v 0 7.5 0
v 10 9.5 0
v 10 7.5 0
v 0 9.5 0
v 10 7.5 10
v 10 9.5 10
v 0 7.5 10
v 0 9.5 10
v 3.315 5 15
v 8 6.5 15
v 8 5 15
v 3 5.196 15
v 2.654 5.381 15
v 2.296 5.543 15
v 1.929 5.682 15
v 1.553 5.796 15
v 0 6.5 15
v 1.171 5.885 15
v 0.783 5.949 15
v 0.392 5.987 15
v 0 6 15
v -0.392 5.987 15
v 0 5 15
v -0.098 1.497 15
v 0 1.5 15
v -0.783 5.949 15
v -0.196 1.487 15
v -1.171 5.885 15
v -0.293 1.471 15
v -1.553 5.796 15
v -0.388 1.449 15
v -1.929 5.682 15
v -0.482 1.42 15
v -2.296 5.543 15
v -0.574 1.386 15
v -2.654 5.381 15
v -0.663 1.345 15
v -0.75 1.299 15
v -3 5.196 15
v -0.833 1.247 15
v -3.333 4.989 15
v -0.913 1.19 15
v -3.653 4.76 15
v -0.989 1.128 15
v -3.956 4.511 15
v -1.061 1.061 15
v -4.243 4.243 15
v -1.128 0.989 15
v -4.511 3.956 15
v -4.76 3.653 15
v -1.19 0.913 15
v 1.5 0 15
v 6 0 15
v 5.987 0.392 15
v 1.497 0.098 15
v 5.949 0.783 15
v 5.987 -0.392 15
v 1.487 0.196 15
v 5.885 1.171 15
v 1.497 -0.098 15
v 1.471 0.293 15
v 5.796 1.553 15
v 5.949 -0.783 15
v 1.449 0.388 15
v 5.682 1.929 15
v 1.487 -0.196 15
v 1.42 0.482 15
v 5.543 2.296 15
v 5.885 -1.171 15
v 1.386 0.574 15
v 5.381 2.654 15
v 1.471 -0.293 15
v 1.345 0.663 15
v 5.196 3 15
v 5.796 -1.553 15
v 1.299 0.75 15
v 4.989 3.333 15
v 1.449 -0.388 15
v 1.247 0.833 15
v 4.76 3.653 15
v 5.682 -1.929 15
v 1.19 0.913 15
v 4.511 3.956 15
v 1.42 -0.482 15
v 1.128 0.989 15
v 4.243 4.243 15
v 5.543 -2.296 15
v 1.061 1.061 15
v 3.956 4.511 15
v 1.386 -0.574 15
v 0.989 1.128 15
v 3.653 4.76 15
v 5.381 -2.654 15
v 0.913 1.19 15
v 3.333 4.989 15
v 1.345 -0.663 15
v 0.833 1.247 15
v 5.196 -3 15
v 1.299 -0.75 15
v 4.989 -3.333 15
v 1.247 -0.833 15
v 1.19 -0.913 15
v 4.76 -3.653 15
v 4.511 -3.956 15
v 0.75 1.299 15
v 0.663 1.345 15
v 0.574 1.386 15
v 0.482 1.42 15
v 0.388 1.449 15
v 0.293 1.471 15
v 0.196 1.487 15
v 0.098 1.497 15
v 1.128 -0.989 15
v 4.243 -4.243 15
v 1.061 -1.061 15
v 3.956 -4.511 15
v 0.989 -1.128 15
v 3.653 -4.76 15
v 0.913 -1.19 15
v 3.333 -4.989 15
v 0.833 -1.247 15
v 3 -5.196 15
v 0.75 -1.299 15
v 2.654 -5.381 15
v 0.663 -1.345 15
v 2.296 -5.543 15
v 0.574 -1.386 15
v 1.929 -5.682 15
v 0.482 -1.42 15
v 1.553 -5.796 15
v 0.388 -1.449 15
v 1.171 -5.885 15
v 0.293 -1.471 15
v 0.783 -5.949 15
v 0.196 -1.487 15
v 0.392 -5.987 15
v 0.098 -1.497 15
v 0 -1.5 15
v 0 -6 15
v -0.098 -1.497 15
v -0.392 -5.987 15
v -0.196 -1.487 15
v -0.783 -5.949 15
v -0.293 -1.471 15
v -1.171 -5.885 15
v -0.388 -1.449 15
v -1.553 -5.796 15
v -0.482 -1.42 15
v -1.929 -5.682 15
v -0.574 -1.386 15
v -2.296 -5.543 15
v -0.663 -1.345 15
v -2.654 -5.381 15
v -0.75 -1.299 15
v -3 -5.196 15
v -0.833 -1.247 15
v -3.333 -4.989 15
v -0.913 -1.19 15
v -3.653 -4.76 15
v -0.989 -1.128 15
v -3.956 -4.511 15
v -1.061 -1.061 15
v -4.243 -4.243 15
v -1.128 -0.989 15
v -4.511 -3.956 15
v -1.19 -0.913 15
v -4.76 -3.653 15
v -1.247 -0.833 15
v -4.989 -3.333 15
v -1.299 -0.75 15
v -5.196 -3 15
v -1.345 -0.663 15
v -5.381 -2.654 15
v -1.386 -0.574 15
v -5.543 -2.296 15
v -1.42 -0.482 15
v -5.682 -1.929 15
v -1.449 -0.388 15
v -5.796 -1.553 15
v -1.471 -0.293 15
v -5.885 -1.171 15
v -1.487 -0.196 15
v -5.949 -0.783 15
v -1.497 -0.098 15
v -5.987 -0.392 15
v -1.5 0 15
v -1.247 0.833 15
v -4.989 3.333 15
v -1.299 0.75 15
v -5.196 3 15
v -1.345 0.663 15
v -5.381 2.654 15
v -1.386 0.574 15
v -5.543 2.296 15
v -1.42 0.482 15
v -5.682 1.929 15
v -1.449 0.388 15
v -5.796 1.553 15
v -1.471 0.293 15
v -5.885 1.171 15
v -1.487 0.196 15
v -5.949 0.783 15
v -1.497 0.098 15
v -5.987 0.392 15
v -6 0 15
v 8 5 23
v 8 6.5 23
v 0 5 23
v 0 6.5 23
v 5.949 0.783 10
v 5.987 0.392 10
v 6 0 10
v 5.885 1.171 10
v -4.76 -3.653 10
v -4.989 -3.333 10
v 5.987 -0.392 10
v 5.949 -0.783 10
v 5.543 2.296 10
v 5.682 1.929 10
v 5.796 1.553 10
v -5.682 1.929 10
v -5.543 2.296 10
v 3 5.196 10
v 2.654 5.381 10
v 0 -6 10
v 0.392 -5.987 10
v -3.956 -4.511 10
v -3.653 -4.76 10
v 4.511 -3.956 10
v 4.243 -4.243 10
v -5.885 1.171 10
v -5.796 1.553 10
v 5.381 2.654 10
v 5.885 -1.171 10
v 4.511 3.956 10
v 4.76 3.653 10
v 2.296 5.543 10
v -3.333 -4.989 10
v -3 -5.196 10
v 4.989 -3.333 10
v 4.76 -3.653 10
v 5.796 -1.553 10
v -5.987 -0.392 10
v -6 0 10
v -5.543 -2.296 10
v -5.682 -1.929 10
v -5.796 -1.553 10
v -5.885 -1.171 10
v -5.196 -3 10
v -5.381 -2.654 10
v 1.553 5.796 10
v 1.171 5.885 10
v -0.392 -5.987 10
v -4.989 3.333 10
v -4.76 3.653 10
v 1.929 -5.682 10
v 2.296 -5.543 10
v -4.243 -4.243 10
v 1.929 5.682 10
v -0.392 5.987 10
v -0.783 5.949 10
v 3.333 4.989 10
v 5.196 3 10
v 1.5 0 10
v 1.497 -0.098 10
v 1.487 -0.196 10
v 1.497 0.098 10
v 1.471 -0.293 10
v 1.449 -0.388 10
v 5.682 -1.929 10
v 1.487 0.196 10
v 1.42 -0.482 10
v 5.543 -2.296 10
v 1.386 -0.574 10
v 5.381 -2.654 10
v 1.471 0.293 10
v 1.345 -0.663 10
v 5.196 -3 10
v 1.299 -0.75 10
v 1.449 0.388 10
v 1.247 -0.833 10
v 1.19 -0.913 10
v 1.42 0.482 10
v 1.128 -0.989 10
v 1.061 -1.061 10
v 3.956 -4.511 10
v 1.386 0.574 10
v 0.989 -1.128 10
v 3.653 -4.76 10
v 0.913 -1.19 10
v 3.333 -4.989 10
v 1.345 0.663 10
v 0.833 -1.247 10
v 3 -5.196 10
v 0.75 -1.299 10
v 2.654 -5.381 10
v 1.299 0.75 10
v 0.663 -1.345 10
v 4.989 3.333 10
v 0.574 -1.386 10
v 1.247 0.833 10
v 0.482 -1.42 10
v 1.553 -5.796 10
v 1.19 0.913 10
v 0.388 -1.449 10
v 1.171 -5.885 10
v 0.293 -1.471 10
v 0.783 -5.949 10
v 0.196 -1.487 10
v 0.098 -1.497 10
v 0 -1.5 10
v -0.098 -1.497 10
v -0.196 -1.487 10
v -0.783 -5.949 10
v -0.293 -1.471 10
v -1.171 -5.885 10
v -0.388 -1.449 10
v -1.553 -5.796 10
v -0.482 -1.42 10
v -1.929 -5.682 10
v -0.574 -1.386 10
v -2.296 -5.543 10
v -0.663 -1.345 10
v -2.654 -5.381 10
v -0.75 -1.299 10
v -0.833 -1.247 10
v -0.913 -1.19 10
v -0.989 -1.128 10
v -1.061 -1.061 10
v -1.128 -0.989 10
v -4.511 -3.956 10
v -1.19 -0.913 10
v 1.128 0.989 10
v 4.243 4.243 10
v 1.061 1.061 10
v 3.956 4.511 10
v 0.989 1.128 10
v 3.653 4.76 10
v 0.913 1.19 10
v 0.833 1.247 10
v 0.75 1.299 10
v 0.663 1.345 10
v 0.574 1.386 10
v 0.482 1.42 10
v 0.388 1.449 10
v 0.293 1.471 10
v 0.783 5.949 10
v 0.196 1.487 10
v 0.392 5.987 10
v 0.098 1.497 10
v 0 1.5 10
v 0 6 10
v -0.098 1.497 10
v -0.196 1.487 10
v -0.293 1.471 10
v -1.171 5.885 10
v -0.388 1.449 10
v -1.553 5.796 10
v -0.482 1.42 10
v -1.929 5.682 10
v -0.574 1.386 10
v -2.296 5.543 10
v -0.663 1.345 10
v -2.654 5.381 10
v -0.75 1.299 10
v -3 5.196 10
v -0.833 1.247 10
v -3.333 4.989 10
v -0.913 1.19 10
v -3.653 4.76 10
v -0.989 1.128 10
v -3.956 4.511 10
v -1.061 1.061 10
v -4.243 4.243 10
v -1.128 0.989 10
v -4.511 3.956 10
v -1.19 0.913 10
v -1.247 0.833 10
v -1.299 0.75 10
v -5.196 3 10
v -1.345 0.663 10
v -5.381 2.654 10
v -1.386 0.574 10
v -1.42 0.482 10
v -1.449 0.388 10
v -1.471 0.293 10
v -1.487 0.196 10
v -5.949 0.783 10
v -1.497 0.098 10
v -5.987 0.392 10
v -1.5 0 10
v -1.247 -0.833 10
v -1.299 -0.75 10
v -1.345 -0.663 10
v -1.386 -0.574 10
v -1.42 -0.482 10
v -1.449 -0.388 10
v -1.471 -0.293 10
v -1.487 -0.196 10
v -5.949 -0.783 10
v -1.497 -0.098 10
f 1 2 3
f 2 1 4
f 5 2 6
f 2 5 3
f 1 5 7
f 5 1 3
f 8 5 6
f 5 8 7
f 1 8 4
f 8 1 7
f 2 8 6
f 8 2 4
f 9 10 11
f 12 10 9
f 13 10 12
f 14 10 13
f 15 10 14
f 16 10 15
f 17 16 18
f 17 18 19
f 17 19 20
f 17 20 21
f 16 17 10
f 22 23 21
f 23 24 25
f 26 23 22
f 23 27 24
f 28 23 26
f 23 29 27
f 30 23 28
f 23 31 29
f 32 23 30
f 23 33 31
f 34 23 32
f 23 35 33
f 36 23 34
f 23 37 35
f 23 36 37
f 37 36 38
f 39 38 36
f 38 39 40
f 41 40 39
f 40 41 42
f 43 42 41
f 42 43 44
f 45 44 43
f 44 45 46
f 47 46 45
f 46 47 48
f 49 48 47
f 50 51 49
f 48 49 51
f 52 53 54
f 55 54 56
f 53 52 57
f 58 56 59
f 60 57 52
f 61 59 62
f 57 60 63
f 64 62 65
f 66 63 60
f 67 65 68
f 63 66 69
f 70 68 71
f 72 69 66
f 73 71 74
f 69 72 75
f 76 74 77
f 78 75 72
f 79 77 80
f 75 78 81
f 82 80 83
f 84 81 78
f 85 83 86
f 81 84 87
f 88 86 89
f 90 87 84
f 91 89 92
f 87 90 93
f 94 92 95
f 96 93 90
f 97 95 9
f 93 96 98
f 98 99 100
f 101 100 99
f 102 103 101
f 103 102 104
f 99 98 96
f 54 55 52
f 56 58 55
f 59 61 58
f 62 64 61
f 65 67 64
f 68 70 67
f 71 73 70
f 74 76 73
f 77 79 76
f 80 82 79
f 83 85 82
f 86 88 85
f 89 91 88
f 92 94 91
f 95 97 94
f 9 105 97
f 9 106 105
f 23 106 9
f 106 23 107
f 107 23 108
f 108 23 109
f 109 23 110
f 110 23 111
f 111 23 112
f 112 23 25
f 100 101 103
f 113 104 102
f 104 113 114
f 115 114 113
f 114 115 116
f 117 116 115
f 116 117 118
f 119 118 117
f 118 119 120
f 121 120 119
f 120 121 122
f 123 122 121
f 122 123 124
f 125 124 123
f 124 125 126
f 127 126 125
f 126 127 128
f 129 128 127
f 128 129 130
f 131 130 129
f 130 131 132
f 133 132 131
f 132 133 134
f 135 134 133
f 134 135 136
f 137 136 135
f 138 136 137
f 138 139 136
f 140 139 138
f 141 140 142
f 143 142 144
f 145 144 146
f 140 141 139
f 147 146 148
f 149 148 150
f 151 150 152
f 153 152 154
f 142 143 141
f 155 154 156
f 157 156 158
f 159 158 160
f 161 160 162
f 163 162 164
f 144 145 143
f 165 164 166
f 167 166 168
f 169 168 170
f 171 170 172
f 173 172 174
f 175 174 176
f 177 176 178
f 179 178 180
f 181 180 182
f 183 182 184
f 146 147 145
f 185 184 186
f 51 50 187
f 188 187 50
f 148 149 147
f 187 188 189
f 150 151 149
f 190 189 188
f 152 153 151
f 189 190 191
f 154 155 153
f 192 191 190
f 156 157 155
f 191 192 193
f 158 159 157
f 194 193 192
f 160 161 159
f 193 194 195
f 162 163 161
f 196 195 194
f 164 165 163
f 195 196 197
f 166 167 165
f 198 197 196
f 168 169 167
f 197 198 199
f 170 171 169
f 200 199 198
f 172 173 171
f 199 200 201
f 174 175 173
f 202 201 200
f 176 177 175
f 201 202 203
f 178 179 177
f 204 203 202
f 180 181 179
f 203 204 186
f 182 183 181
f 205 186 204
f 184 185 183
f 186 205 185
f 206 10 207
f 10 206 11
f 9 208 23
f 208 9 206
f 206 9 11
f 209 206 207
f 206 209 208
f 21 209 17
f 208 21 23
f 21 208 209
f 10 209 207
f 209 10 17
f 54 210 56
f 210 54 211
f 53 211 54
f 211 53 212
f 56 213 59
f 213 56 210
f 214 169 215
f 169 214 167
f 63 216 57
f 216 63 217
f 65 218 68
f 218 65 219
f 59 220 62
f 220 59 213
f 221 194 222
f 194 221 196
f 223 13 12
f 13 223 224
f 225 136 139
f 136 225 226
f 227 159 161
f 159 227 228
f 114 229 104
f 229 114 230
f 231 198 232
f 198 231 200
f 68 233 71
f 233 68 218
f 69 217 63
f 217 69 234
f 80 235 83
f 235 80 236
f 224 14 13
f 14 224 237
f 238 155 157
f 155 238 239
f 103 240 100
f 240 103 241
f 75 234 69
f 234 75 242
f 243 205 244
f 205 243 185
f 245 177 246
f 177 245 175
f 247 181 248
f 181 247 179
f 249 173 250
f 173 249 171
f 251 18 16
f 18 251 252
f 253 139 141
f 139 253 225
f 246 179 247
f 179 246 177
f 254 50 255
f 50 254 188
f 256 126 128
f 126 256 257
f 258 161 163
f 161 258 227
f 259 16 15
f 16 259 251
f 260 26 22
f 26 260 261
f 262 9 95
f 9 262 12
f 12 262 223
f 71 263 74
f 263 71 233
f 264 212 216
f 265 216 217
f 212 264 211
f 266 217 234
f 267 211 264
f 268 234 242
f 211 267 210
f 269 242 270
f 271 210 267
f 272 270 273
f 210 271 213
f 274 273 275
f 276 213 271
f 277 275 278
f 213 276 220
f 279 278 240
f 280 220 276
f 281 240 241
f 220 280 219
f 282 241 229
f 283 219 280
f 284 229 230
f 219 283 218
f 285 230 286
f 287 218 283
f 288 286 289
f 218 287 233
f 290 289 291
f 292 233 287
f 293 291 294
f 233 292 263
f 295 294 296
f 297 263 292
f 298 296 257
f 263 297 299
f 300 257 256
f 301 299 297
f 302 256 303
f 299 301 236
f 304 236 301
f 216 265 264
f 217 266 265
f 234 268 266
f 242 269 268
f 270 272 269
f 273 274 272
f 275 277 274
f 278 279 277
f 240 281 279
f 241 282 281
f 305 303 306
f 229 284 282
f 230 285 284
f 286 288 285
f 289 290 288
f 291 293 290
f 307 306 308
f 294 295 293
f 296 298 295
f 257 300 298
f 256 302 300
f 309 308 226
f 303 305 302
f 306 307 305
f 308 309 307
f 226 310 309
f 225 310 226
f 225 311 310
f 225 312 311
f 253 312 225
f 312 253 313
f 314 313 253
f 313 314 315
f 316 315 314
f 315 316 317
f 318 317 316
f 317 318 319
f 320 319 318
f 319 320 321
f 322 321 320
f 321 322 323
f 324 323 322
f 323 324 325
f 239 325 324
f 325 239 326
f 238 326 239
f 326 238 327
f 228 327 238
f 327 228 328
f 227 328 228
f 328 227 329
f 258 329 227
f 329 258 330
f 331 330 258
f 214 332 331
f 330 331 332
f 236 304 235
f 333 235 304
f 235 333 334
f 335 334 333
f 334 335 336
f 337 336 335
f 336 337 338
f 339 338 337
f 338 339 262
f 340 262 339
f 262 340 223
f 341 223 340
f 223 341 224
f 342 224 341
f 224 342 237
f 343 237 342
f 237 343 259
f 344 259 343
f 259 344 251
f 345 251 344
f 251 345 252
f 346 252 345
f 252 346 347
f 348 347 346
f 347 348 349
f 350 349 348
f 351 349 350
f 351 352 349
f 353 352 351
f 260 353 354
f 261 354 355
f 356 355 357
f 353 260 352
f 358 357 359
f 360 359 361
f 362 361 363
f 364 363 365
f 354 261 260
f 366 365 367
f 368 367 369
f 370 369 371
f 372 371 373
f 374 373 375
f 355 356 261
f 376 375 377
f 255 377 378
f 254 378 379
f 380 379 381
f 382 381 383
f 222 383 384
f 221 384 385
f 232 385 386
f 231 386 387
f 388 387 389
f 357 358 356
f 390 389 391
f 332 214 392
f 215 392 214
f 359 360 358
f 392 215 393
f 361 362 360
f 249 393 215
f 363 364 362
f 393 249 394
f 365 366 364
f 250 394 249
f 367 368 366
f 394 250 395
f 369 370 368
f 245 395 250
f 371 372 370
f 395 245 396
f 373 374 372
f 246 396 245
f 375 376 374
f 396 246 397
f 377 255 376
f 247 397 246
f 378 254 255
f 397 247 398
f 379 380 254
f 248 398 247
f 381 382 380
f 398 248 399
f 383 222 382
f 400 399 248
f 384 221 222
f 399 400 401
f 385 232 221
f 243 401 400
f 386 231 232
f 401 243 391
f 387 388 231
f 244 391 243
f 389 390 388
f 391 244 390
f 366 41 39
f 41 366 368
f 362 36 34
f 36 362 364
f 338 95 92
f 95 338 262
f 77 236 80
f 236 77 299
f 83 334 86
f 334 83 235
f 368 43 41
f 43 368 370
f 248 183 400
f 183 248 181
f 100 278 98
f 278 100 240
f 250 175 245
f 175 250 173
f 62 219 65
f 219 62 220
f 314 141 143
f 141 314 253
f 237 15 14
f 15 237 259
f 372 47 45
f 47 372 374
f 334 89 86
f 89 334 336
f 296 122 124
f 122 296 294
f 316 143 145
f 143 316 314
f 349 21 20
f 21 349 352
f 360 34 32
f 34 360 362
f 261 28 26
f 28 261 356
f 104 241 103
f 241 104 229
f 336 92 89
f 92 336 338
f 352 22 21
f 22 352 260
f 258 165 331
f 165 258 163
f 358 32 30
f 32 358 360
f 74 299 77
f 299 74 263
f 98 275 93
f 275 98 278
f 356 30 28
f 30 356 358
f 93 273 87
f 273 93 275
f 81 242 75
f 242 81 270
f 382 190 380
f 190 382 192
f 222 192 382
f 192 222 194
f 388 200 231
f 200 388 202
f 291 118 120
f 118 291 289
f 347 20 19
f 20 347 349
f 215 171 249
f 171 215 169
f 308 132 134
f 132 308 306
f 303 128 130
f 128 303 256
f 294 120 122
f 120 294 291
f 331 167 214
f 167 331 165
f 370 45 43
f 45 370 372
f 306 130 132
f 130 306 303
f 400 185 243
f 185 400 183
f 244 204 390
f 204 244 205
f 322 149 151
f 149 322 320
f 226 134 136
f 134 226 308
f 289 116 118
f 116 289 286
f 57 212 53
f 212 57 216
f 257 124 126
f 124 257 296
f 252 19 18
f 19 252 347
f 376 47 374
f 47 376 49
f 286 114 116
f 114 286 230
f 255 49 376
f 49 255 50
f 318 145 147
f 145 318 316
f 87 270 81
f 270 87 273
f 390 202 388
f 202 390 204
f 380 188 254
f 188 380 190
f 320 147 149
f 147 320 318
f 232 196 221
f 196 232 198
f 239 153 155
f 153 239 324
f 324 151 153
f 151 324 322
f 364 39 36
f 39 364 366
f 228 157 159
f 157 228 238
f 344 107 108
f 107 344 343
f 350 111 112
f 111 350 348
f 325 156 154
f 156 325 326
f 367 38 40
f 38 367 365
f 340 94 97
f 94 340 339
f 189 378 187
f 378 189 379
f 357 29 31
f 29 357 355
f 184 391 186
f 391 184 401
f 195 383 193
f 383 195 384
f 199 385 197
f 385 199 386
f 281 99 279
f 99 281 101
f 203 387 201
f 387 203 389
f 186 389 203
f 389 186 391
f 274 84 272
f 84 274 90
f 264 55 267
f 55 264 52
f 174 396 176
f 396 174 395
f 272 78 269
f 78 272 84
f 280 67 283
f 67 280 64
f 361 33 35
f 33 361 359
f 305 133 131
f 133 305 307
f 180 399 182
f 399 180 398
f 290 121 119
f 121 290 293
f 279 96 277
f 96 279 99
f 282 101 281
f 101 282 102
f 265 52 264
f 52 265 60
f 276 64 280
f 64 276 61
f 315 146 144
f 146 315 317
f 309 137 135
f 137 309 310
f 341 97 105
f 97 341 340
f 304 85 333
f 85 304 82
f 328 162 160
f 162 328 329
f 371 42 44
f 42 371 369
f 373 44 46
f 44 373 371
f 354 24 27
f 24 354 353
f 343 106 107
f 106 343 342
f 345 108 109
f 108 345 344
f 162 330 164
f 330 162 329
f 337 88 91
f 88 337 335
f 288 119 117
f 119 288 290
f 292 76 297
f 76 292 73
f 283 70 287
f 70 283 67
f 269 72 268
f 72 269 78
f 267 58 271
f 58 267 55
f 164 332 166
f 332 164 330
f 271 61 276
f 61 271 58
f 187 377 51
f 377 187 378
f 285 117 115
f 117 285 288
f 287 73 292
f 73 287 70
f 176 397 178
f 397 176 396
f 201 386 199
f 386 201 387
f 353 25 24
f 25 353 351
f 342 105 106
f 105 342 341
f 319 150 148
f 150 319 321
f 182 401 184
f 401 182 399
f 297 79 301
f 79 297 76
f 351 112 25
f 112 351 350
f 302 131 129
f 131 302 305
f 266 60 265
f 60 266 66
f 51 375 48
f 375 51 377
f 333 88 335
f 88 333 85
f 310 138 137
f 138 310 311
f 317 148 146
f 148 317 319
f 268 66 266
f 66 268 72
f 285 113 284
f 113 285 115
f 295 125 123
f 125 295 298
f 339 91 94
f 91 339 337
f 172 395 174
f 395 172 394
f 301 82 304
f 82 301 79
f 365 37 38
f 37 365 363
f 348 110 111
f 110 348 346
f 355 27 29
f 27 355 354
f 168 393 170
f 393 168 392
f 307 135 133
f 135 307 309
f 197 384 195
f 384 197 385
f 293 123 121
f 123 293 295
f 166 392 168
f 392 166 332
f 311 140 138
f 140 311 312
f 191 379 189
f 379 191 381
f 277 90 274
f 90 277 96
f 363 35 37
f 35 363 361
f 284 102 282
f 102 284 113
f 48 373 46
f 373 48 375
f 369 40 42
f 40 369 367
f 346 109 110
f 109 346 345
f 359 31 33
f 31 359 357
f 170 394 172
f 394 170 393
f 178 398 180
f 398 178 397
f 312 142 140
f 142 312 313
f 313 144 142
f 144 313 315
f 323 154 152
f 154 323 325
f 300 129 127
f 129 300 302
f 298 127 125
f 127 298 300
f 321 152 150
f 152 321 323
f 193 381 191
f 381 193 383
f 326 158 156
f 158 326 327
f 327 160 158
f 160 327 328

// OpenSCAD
// Straight hose-barb reducer: 8 mm tubing (bottom) -> 5 mm tubing (top)
// Print orientation: standing upright along +Z, centred on origin in X/Y
// Units: mm

$fn = 96;

// ---------------- Dimensions ----------------
// Tubing
t8_id    = 8;    // 8 mm tubing inner diameter
t5_id    = 5;    // 5 mm tubing inner diameter

// Barb parameters
t8_h     = 10;   // 8 mm barb height
t8_od    = 9.5;  // 8 mm barb outer diameter at top
t8_od_b  = 7.5;  // 8 mm barb outer diameter at bottom
t8_n     = 2;    // number of 8 mm barbs

t5_h     = 8;    // 5 mm barb height
t5_od    = 5.0;  // 5 mm barb outer diameter at top
t5_od_b  = 6.5;  // 5 mm barb outer diameter at bottom
t5_n     = 2;    // number of 5 mm barbs

// Bore
bore_d   = 3;    // through-bore diameter

// Collar
collar_d = 12;   // collar outer diameter
collar_h = 5;    // collar height (z = 20 to z = 25)

// Derived
t8_bottom_z = 0;
t8_top_z    = t8_bottom_z + t8_h;
t5_bottom_z = t8_top_z + collar_h;
t5_top_z    = t5_bottom_z + t5_h;
eps         = 0.5; // overshoot for clean cuts

// ---------------- Model ----------------
difference() {
    union() {
        // 8 mm barbs (sawtooth profile)
        for (i = [0 : t8_n - 1])
            translate([0, 0, t8_bottom_z])
                rotate([0, 0, 0])
                    linear_extrude(height = t8_h)
                        polygon(points = [
                            [0, t8_od_b],
                            [t8_h, t8_od_b],
                            [t8_h, t8_od],
                            [0, t8_od]
                        ]);

        // Collar
        translate([0, 0, t8_top_z])
            cylinder(d = collar_d, h = collar_h);

        // 5 mm barbs (sawtooth profile)
        for (i = [0 : t5_n - 1])
            translate([0, 0, t5_bottom_z])
                rotate([0, 0, 0])
                    linear_extrude(height = t5_h)
                        polygon(points = [
                            [0, t5_od_b],
                            [t5_h, t5_od_b],
                            [t5_h, t5_od],
                            [0, t5_od]
                        ]);
    }

    // Through bore
    translate([0, 0, t8_bottom_z - eps])
        rotate([0, 0, 0])
            cylinder(d = bore_d, h = t5_top_z + 2 * eps);
}
